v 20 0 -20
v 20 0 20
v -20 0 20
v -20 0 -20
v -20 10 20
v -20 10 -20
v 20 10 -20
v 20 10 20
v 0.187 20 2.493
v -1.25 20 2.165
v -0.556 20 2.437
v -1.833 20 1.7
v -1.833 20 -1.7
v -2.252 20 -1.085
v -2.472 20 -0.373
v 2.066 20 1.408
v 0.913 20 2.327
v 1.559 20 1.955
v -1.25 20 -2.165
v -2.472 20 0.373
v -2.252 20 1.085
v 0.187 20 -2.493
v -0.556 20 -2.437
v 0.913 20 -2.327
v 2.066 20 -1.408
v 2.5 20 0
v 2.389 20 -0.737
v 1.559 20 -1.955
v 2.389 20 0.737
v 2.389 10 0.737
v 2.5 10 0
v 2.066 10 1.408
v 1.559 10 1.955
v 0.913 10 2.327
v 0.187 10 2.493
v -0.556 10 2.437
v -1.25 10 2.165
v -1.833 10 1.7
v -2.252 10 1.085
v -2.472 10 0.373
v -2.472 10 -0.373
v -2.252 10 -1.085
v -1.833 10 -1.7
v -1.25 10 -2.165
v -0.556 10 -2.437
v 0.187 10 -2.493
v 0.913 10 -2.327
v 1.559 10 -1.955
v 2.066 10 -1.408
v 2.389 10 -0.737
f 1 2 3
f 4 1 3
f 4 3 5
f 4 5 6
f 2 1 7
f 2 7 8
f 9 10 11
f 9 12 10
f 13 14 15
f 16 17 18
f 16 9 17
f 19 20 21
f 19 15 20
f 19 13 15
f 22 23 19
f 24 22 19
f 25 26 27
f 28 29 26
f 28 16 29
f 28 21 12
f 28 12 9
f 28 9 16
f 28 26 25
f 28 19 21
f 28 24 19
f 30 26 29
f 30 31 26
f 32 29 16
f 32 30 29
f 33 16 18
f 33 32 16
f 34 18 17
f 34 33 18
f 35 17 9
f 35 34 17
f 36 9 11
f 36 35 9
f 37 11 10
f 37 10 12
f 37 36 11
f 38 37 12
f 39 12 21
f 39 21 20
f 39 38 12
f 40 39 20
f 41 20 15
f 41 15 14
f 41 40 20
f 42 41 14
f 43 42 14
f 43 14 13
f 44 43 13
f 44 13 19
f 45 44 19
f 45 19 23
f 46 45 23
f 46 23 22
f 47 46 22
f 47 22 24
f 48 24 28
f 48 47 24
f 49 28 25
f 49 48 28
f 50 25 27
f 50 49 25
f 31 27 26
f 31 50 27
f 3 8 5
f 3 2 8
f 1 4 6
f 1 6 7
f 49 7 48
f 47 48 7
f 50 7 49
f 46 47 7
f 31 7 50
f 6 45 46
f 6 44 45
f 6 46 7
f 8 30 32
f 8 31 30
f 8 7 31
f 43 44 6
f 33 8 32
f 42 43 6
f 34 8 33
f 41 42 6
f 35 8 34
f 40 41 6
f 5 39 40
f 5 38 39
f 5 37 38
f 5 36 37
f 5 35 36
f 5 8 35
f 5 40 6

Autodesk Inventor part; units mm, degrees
ref_plane "YZ Plane" through (0, 0, 0) normal (1, 0, 0) x (0, 1, 0)
ref_plane "XZ Plane" through (0, 0, 0) normal (0, 1, 0) x (-1, 0, 0)
ref_plane "XY Plane" through (0, 0, 0) normal (0, 0, 1) x (1, 0, 0)
sketch "Sketch1" plane through (0, 0, 0) normal (0, 1, 0) x (-1, 0, 0)
  line L0 (20, -20) -> (-20, -20)
  line L1 (-20, -20) -> (-20, 20)
  line L2 (-20, 20) -> (20, 20)
  line L3 (20, 20) -> (20, -20)
  line L4 (20, -20) -> (-20, 20) construction
  line L5 (-20, -20) -> (20, 20) construction
  point P0 (0, 0)
  dimension "d0" = 40
  dimension "d1" = 40
extrude "Extrusion1" add sketch "Sketch1" along normal blind 10
sketch "Sketch2" plane through (0, 10, 0) normal (0, 1, 0) x (1, 0, 0)
  line L0 (20, 20) -> (-20, 20) projected
  line L1 (-20, -20) -> (20, -20) projected
  line L2 (-20, 20) -> (20, -20)
  circle A0 centre (0, 0) radius 2.5
  dimension "d4" = 5
extrude "Extrusion2" add sketch "Sketch2" along normal blind 10
properties part number "Base"
